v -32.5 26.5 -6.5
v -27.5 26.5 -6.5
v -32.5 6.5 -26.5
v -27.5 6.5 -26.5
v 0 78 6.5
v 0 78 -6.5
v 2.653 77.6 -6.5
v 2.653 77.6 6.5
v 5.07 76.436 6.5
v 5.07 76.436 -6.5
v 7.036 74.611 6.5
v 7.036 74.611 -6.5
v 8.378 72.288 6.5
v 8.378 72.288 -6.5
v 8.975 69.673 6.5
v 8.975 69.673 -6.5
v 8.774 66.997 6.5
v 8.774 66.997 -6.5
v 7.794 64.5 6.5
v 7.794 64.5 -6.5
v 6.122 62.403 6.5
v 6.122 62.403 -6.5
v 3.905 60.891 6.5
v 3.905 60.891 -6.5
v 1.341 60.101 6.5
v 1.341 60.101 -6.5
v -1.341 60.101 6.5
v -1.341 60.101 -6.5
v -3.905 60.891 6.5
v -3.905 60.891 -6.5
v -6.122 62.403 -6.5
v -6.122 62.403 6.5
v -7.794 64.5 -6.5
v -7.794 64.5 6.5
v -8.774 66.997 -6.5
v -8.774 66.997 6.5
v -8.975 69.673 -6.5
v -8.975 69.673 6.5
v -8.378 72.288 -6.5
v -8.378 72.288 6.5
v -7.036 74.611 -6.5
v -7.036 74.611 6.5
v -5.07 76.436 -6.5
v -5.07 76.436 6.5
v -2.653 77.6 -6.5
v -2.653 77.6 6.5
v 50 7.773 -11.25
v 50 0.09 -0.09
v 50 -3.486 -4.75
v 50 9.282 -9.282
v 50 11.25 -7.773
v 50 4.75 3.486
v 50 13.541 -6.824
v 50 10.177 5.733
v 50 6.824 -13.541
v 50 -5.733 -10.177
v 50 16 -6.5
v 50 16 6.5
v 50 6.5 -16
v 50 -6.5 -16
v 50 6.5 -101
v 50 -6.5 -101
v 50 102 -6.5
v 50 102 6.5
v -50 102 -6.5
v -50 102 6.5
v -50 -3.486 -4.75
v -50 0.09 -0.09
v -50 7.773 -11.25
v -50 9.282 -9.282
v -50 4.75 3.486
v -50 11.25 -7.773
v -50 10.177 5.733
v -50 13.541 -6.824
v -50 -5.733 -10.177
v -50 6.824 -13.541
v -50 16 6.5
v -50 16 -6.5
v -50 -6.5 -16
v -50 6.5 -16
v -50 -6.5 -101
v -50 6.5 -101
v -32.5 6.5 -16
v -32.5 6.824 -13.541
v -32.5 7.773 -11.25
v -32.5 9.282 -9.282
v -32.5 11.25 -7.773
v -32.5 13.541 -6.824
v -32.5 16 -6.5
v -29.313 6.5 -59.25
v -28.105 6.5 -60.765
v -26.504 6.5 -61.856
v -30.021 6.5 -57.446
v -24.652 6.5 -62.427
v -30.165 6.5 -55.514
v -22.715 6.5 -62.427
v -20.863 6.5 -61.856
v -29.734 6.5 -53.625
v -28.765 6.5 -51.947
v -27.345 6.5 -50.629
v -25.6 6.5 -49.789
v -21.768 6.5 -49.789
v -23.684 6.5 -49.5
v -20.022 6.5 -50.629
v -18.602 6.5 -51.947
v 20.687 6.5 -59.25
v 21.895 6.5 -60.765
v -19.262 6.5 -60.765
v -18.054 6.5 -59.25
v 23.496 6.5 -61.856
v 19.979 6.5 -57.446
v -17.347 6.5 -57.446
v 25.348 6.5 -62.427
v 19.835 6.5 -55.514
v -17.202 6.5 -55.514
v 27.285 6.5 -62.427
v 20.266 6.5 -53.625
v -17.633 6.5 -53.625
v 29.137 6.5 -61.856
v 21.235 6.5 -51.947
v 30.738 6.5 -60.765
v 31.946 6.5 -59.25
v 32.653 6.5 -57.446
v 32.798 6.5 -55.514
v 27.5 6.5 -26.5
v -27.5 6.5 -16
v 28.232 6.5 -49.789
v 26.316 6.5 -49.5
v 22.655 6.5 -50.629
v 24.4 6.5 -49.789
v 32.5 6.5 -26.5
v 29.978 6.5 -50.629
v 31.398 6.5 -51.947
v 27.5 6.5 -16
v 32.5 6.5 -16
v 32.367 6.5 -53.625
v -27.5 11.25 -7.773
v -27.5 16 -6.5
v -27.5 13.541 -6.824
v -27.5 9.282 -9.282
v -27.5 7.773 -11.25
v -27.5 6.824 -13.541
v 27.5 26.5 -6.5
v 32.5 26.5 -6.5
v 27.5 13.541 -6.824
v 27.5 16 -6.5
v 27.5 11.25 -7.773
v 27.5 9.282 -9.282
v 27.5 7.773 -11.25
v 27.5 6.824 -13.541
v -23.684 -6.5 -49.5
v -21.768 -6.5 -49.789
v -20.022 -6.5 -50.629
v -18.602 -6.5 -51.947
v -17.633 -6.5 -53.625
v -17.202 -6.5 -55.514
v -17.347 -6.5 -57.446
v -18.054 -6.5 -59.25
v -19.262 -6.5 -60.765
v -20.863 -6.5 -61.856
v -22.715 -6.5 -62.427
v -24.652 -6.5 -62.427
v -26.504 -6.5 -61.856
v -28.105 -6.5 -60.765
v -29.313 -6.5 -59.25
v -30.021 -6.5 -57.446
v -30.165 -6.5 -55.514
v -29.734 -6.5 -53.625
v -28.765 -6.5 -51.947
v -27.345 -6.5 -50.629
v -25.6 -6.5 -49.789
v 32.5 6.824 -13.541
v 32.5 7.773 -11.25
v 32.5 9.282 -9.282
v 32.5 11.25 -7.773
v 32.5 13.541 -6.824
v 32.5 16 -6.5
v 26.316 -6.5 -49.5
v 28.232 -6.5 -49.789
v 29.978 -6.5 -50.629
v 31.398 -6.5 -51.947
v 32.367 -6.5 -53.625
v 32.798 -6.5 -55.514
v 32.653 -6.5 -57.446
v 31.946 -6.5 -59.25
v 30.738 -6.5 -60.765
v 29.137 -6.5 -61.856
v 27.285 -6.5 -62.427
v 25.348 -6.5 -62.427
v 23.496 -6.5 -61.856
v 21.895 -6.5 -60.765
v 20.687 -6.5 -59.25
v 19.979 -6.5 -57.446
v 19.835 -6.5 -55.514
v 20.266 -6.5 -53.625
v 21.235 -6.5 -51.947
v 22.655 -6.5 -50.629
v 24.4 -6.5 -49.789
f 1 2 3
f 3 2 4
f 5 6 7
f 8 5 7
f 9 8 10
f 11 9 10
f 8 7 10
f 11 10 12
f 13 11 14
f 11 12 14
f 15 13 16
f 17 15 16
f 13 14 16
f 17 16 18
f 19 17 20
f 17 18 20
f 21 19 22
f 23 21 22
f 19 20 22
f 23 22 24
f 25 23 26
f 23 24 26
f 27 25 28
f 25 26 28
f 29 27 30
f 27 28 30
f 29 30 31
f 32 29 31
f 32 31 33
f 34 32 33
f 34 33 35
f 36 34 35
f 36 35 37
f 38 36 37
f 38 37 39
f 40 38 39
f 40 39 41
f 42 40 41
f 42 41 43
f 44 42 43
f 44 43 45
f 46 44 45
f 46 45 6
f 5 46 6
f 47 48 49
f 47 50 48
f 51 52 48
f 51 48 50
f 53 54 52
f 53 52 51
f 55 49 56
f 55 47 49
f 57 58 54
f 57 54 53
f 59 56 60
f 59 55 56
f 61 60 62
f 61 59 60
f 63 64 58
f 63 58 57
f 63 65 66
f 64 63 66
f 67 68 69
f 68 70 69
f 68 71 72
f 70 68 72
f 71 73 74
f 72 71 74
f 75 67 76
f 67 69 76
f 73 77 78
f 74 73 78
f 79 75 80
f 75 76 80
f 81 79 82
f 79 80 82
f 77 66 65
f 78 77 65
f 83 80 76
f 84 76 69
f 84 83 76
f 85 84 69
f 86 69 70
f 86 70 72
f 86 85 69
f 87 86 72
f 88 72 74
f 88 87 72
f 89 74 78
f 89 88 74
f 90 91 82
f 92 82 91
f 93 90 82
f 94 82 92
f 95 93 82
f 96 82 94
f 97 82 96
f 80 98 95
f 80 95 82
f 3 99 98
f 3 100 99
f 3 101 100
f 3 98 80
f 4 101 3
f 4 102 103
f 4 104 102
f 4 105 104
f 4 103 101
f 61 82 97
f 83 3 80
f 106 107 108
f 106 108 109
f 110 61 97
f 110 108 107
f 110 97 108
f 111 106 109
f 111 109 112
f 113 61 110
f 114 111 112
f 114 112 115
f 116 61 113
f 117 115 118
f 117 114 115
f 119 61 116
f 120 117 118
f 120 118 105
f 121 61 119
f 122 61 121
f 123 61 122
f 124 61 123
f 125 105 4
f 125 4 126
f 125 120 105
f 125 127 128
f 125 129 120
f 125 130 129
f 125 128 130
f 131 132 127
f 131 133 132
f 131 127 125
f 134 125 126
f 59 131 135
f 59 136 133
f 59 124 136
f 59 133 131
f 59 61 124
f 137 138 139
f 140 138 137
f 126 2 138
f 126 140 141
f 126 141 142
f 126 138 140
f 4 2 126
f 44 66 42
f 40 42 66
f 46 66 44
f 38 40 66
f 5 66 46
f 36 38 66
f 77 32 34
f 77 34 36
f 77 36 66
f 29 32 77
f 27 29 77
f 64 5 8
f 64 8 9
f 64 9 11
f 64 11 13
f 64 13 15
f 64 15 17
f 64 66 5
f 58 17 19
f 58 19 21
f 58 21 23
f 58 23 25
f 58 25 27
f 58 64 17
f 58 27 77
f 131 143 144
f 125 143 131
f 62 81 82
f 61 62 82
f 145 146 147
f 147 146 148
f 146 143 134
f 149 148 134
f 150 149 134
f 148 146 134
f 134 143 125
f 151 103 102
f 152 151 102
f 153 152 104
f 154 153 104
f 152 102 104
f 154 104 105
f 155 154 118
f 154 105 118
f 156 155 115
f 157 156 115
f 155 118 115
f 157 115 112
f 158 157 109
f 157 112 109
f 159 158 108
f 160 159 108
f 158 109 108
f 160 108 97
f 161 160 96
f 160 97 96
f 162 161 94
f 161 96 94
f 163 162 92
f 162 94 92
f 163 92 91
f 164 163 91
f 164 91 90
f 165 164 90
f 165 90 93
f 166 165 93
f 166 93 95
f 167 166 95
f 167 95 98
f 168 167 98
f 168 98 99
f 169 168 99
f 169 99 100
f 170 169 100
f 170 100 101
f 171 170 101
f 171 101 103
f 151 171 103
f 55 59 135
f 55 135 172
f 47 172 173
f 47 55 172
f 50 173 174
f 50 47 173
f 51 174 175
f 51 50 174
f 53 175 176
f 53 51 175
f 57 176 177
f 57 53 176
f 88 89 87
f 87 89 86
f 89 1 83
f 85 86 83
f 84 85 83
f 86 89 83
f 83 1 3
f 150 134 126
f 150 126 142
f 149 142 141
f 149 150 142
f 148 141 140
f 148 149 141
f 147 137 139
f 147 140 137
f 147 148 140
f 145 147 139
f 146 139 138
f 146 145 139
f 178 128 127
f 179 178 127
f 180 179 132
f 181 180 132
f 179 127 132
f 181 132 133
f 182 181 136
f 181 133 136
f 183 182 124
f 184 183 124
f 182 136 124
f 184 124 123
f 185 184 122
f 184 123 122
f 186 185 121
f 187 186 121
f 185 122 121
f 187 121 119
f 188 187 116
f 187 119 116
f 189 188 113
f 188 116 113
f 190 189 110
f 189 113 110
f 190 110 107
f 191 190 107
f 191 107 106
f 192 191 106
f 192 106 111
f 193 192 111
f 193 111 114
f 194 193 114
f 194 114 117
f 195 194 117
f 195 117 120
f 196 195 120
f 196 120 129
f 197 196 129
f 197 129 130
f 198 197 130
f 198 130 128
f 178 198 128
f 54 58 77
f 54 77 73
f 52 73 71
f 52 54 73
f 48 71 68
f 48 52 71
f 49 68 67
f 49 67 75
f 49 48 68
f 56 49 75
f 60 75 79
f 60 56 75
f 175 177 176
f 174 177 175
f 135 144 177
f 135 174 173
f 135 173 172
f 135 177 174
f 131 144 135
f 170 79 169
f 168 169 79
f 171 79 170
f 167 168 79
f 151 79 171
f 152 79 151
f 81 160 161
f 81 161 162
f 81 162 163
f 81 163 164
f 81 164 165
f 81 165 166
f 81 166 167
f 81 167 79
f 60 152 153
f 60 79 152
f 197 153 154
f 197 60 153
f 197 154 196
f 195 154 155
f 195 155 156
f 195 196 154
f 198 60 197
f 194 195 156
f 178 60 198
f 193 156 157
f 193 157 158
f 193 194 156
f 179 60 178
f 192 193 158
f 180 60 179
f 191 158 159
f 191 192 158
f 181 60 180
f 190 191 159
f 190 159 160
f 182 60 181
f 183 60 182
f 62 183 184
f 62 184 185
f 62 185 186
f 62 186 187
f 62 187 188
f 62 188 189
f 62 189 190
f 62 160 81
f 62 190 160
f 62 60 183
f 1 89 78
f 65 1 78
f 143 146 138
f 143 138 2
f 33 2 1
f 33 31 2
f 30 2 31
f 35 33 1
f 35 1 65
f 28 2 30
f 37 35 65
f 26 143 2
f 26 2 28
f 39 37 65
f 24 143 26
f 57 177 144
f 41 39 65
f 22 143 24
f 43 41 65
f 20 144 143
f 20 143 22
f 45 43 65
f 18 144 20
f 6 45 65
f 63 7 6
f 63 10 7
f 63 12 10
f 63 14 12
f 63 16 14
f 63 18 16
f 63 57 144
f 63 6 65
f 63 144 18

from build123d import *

# Parameters (mm, degrees)
ESTRUSIONE_SOTTILE1_DEPTH = 50
SCHIZZO2_R                = 9
TAGLIO_ESTRUSIONE1_DEPTH  = 148.764170217
SCHIZZO3_R                = 6.5
TAGLIO_ESTRUSIONE2_DEPTH  = 148.720174655
NERVATURA1_REACH          = 166.332
SCHIZZO4_WALL_W           = 358.948233372
SCHIZZO4_WALL_H           = 5


with BuildPart() as part:
    # Schizzo1 → Estrusione-Sottile1 (new, symmetric)
    with BuildSketch(Plane(origin=(0, 0, 0), x_dir=(0, 0, -1), z_dir=(1, 0, 0))):
        with BuildLine():
            Line((-6.5, 102), (-6.5, 16))
            ThreePointArc((-6.5, 16), (0.090097423, 0.090097423), (16, -6.5))
            Line((16, -6.5), (101, -6.5))
            Line((101, -6.5), (101, 6.5))
            Line((101, 6.5), (16, 6.5))
            ThreePointArc((16, 6.5), (9.282485579, 9.282485579), (6.5, 16))
            Line((6.5, 16), (6.5, 102))
            Line((6.5, 102), (-6.5, 102))
        make_face()
    extrude(amount=ESTRUSIONE_SOTTILE1_DEPTH, both=True)

    # Schizzo2 → Taglio-Estrusione1 (cut, through all)
    with BuildSketch(Plane(origin=(0, 0, -6.5), x_dir=(-1, 0, 0), z_dir=(0, 0, -1))):
        with Locations(Location((0, 69, 0), (0, 0, 90))):
            Circle(SCHIZZO2_R)
    extrude(amount=-TAGLIO_ESTRUSIONE1_DEPTH, mode=Mode.SUBTRACT)

    # Schizzo3 → Taglio-Estrusione2 (cut, through all)
    with BuildSketch(Plane(origin=(0, 6.5, 0), x_dir=(1, 0, 0), z_dir=(0, 1, 0))):
        with Locations(Location((-23.683594655, 56, 0), (0, 0, 270))):
            Circle(SCHIZZO3_R)
        with Locations(Location((26.316405345, 56, 0), (0, 0, 270))):
            Circle(SCHIZZO3_R)
    extrude(amount=-TAGLIO_ESTRUSIONE2_DEPTH, mode=Mode.SUBTRACT)

    # Schizzo4 wall → Nervatura1 (add, up to next)
    with BuildSketch(Plane(origin=(30, 16.5, -16.5), x_dir=(0, -0.707106781187, -0.707106781187), z_dir=(0, 0.707106781187, -0.707106781187)), mode=Mode.PRIVATE) as nervatura1_sk1:
        Rectangle(SCHIZZO4_WALL_W, SCHIZZO4_WALL_H)
    nervatura1_tool1 = extrude(nervatura1_sk1.sketch, amount=-NERVATURA1_REACH, mode=Mode.PRIVATE) - part.part
    nervatura1 = nervatura1_tool1.solids().sort_by_distance((30, 16.5, -16.5))[0]
    add(nervatura1)

    # Specchia1: Nervatura1 across plane
    add(nervatura1.mirror(Plane(origin=(0, 0, 0), x_dir=(0, 0, 1), z_dir=(1, 0, 0))))


solid = part.part
